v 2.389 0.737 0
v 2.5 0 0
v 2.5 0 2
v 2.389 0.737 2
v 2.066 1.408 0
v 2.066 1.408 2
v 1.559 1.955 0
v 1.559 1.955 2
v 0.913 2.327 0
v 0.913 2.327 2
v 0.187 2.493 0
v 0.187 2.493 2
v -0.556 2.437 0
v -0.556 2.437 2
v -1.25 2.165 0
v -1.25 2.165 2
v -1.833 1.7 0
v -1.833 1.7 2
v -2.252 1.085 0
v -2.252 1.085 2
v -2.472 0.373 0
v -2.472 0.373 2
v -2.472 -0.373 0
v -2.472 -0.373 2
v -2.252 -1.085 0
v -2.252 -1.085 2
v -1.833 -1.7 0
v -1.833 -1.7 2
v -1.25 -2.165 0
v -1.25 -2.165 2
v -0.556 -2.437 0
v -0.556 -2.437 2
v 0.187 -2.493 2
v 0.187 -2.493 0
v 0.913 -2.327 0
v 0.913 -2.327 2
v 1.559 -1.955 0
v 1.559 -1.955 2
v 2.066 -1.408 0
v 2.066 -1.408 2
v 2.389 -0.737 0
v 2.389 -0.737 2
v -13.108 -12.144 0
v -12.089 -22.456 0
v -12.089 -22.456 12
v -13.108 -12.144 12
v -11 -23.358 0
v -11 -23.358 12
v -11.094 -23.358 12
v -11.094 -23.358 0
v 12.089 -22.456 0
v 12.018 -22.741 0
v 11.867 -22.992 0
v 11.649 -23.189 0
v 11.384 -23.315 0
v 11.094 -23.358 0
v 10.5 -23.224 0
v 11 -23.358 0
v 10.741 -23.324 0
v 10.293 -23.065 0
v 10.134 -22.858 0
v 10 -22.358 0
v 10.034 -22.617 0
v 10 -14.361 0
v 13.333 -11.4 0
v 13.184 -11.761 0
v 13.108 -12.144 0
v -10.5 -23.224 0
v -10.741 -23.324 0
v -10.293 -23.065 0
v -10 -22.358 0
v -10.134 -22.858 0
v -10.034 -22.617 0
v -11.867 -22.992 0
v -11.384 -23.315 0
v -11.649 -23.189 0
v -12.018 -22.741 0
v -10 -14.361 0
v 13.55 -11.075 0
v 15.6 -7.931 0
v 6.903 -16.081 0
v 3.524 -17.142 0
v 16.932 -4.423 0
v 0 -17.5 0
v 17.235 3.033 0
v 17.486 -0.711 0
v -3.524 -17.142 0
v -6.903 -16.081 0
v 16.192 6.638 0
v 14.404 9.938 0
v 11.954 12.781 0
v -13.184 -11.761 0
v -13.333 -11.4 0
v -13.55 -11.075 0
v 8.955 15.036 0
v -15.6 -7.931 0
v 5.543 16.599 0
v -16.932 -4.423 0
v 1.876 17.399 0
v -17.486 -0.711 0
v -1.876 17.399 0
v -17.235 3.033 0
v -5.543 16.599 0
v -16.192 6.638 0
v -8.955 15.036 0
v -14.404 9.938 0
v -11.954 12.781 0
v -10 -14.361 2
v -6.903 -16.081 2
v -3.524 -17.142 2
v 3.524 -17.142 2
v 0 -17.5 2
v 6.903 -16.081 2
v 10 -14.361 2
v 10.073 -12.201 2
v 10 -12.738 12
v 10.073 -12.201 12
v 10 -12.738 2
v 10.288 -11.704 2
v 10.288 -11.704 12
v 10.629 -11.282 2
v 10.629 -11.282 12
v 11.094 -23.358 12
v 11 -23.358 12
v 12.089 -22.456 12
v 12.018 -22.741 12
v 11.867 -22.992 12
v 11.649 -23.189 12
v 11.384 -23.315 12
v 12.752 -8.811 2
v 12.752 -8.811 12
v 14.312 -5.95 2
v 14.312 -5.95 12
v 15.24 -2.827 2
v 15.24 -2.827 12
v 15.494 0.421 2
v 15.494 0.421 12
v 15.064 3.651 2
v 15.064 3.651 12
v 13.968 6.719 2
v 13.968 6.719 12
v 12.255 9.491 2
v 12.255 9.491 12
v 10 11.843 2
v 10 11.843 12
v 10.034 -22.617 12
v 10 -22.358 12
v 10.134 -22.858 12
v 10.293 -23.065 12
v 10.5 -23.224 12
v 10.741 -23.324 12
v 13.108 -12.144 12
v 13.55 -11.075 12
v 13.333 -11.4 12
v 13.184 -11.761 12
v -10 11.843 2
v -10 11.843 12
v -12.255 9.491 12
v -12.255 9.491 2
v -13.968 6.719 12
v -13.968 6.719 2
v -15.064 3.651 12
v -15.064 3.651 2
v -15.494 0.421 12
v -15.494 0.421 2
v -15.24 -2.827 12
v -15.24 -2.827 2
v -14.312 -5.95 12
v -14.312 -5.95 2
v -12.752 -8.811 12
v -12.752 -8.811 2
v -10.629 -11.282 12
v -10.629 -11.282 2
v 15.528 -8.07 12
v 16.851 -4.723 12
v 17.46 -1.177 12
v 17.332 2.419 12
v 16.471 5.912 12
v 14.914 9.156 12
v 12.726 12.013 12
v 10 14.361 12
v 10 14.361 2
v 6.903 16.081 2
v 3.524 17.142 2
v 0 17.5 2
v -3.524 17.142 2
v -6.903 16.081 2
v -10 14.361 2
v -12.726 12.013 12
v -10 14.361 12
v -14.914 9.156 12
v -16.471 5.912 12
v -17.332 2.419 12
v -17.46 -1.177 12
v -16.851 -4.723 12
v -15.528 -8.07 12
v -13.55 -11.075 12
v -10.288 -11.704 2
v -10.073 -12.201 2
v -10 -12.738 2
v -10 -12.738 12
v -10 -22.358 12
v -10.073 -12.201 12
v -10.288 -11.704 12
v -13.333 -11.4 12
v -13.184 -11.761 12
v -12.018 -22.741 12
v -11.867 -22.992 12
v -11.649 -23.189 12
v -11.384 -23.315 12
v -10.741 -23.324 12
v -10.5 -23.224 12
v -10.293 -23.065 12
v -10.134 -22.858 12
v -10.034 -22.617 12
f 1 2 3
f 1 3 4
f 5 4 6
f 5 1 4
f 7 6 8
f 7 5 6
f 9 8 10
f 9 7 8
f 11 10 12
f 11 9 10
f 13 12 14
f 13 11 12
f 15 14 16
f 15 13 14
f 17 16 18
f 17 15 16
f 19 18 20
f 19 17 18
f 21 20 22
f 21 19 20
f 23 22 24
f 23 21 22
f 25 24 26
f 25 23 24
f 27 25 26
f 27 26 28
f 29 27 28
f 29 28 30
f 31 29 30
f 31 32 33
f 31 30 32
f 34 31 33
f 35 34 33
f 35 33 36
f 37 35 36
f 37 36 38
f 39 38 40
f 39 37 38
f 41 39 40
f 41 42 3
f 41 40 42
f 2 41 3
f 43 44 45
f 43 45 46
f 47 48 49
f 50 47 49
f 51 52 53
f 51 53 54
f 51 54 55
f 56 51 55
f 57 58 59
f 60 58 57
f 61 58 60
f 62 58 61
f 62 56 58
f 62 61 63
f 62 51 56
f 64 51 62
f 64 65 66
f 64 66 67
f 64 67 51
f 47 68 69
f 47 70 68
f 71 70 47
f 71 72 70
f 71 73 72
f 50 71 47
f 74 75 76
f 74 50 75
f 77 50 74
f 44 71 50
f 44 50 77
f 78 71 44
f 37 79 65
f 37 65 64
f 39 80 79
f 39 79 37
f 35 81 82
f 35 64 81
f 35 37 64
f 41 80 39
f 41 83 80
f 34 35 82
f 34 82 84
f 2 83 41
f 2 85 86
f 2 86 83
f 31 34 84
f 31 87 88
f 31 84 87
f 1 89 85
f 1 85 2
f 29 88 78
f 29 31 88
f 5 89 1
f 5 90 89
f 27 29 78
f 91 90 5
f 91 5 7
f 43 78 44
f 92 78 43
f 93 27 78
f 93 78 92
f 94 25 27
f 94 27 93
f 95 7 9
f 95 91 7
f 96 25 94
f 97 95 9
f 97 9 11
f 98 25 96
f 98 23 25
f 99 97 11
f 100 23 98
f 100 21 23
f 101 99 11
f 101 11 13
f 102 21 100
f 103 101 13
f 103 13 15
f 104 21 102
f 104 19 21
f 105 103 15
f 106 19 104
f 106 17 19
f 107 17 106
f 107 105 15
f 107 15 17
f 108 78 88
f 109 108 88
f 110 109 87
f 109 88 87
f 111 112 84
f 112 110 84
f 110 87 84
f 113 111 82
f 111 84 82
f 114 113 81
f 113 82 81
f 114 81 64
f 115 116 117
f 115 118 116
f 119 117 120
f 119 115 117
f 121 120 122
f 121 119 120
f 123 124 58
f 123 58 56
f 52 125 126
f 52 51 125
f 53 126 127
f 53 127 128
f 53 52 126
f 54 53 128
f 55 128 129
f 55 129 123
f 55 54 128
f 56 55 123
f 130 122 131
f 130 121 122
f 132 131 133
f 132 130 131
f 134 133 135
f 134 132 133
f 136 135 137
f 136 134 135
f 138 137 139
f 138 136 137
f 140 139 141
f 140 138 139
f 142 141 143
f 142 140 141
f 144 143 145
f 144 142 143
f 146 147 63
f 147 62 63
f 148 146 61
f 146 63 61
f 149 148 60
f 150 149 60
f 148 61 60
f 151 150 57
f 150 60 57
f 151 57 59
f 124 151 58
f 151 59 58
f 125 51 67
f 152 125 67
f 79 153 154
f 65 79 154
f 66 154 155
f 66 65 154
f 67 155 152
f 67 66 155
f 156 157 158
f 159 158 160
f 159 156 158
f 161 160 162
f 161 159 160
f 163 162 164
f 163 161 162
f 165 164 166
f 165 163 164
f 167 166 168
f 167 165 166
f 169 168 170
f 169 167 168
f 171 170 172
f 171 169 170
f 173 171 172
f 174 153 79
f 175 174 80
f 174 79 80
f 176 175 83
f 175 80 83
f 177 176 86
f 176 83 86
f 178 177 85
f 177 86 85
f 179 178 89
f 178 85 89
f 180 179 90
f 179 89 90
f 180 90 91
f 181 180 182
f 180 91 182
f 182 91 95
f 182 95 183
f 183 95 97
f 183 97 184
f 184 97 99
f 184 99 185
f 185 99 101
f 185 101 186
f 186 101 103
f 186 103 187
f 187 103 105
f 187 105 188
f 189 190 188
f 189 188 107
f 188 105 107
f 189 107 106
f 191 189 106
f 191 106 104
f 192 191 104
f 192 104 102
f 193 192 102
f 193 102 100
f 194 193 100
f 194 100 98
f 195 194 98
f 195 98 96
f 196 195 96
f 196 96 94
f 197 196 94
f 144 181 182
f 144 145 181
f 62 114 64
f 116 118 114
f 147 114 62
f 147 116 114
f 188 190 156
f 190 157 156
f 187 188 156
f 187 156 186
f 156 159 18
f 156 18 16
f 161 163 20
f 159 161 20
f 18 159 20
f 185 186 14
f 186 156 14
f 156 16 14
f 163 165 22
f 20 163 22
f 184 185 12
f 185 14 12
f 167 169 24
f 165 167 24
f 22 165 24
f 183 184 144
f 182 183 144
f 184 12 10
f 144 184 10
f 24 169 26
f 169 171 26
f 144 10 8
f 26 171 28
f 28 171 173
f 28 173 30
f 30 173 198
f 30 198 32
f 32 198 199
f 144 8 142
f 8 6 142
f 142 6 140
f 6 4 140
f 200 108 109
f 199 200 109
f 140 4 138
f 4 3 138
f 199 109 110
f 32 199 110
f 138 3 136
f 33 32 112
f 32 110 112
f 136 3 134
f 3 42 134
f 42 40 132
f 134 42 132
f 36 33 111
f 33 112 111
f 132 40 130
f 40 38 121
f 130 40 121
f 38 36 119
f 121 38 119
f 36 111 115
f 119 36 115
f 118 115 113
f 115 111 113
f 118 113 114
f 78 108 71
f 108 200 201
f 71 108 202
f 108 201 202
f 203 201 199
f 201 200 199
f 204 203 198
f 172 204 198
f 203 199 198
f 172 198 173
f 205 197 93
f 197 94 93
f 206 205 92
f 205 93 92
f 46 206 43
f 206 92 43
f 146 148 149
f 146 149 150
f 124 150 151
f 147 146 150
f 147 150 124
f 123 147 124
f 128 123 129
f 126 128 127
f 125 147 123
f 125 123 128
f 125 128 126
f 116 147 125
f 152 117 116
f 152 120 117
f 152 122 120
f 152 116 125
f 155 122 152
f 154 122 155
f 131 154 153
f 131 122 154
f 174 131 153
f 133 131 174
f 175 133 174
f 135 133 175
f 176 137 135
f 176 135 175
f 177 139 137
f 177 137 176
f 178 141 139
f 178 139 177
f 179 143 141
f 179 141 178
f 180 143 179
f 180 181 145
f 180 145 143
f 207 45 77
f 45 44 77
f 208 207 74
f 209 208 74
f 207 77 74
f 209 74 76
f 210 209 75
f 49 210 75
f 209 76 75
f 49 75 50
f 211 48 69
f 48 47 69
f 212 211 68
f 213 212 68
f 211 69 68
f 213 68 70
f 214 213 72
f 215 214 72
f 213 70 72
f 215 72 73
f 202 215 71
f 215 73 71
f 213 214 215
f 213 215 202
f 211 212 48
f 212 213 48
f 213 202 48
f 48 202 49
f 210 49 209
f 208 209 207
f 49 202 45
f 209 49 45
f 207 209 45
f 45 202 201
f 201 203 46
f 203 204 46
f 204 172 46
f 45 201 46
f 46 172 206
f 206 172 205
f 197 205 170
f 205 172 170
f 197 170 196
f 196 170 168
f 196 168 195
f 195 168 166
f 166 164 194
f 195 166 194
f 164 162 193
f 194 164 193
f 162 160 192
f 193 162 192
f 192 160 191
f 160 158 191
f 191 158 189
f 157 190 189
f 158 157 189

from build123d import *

# Parameters (mm, degrees)
SKETCH1_R               = 17.5
BOSS_EXTRUDE1_DEPTH     = 12
SHELL4_T                = -2
CUT_EXTRUDE1_DEPTH      = 28.504545079
CUT_EXTRUDE1_DEPTH_BACK = 28.504545079
SKETCH3_R               = 2.5
CUT_EXTRUDE2_DEPTH      = 28.504545079
CUT_EXTRUDE2_DEPTH_BACK = 28.504545079
SKETCH4_W               = 20
SKETCH4_H               = 24.94066955
BOSS_EXTRUDE2_DEPTH     = 12
FILLET1_R               = 2
FILLET2_R               = 2
FILLET5_R               = 1


with BuildPart() as part:
    # Sketch1 → Boss-Extrude1 (new body)
    with BuildSketch(Plane.XY):
        Circle(SKETCH1_R)
    extrude(amount=BOSS_EXTRUDE1_DEPTH)

    # Shell4
    shell4_openings = [part.faces().sort_by_distance(p)[0] for p in [
        (0, 0, 12),
    ]]
    offset(amount=SHELL4_T, openings=shell4_openings, kind=Kind.INTERSECTION)

    # Sketch3 → Cut-Extrude1 (cut, two sides: drawn at the far end of the back side and taken through both)
    with BuildSketch(Plane.XY.offset(-CUT_EXTRUDE1_DEPTH_BACK)):
        Circle(SKETCH3_R)
    extrude(amount=CUT_EXTRUDE1_DEPTH + CUT_EXTRUDE1_DEPTH_BACK, mode=Mode.SUBTRACT)

    # Sketch4 → Cut-Extrude2 (cut, two sides: drawn at the far end of the back side and taken through both)
    with BuildSketch(Plane(origin=(0, 0, 0), x_dir=(1, 0, 0), z_dir=(0, 1, 0)).offset(-CUT_EXTRUDE2_DEPTH_BACK)):
        with Locations((0, -14.470334775)):
            Rectangle(SKETCH4_W, SKETCH4_H)
    extrude(amount=CUT_EXTRUDE2_DEPTH + CUT_EXTRUDE2_DEPTH_BACK, mode=Mode.SUBTRACT)

    # Sketch7 → Boss-Extrude2 (add)
    with BuildSketch(Plane.XY.offset(12)):
        Polygon((-10, -14.361406616), (-10, -23.35781655), (-12, -23.35781655), (-13.169286174, -11.524751697), align=None)
        Polygon((10, -14.361406616), (10, -23.35781655), (12, -23.35781655), (13.169286174, -11.524751697), align=None)
    extrude(amount=-BOSS_EXTRUDE2_DEPTH)

    # Fillet1
    fillet1_edges = [part.edges().sort_by_distance(p)[0] for p in [
        (-10, -11.842719282, 7),
        (10, -11.842719282, 7),
    ]]
    fillet(fillet1_edges, radius=FILLET1_R)

    # Fillet2
    fillet2_edges = [part.edges().sort_by_distance(p)[0] for p in [
        (-13.169286174, -11.524751697, 6),
        (13.169286174, -11.524751697, 6),
    ]]
    fillet(fillet2_edges, radius=FILLET2_R)

    # Fillet5
    fillet5_edges = [part.edges().sort_by_distance(p)[0] for p in [
        (-10, -23.35781655, 6),
        (-12, -23.35781655, 6),
        (12, -23.35781655, 6),
        (10, -23.35781655, 6),
    ]]
    fillet(fillet5_edges, radius=FILLET5_R)


solid = part.part
